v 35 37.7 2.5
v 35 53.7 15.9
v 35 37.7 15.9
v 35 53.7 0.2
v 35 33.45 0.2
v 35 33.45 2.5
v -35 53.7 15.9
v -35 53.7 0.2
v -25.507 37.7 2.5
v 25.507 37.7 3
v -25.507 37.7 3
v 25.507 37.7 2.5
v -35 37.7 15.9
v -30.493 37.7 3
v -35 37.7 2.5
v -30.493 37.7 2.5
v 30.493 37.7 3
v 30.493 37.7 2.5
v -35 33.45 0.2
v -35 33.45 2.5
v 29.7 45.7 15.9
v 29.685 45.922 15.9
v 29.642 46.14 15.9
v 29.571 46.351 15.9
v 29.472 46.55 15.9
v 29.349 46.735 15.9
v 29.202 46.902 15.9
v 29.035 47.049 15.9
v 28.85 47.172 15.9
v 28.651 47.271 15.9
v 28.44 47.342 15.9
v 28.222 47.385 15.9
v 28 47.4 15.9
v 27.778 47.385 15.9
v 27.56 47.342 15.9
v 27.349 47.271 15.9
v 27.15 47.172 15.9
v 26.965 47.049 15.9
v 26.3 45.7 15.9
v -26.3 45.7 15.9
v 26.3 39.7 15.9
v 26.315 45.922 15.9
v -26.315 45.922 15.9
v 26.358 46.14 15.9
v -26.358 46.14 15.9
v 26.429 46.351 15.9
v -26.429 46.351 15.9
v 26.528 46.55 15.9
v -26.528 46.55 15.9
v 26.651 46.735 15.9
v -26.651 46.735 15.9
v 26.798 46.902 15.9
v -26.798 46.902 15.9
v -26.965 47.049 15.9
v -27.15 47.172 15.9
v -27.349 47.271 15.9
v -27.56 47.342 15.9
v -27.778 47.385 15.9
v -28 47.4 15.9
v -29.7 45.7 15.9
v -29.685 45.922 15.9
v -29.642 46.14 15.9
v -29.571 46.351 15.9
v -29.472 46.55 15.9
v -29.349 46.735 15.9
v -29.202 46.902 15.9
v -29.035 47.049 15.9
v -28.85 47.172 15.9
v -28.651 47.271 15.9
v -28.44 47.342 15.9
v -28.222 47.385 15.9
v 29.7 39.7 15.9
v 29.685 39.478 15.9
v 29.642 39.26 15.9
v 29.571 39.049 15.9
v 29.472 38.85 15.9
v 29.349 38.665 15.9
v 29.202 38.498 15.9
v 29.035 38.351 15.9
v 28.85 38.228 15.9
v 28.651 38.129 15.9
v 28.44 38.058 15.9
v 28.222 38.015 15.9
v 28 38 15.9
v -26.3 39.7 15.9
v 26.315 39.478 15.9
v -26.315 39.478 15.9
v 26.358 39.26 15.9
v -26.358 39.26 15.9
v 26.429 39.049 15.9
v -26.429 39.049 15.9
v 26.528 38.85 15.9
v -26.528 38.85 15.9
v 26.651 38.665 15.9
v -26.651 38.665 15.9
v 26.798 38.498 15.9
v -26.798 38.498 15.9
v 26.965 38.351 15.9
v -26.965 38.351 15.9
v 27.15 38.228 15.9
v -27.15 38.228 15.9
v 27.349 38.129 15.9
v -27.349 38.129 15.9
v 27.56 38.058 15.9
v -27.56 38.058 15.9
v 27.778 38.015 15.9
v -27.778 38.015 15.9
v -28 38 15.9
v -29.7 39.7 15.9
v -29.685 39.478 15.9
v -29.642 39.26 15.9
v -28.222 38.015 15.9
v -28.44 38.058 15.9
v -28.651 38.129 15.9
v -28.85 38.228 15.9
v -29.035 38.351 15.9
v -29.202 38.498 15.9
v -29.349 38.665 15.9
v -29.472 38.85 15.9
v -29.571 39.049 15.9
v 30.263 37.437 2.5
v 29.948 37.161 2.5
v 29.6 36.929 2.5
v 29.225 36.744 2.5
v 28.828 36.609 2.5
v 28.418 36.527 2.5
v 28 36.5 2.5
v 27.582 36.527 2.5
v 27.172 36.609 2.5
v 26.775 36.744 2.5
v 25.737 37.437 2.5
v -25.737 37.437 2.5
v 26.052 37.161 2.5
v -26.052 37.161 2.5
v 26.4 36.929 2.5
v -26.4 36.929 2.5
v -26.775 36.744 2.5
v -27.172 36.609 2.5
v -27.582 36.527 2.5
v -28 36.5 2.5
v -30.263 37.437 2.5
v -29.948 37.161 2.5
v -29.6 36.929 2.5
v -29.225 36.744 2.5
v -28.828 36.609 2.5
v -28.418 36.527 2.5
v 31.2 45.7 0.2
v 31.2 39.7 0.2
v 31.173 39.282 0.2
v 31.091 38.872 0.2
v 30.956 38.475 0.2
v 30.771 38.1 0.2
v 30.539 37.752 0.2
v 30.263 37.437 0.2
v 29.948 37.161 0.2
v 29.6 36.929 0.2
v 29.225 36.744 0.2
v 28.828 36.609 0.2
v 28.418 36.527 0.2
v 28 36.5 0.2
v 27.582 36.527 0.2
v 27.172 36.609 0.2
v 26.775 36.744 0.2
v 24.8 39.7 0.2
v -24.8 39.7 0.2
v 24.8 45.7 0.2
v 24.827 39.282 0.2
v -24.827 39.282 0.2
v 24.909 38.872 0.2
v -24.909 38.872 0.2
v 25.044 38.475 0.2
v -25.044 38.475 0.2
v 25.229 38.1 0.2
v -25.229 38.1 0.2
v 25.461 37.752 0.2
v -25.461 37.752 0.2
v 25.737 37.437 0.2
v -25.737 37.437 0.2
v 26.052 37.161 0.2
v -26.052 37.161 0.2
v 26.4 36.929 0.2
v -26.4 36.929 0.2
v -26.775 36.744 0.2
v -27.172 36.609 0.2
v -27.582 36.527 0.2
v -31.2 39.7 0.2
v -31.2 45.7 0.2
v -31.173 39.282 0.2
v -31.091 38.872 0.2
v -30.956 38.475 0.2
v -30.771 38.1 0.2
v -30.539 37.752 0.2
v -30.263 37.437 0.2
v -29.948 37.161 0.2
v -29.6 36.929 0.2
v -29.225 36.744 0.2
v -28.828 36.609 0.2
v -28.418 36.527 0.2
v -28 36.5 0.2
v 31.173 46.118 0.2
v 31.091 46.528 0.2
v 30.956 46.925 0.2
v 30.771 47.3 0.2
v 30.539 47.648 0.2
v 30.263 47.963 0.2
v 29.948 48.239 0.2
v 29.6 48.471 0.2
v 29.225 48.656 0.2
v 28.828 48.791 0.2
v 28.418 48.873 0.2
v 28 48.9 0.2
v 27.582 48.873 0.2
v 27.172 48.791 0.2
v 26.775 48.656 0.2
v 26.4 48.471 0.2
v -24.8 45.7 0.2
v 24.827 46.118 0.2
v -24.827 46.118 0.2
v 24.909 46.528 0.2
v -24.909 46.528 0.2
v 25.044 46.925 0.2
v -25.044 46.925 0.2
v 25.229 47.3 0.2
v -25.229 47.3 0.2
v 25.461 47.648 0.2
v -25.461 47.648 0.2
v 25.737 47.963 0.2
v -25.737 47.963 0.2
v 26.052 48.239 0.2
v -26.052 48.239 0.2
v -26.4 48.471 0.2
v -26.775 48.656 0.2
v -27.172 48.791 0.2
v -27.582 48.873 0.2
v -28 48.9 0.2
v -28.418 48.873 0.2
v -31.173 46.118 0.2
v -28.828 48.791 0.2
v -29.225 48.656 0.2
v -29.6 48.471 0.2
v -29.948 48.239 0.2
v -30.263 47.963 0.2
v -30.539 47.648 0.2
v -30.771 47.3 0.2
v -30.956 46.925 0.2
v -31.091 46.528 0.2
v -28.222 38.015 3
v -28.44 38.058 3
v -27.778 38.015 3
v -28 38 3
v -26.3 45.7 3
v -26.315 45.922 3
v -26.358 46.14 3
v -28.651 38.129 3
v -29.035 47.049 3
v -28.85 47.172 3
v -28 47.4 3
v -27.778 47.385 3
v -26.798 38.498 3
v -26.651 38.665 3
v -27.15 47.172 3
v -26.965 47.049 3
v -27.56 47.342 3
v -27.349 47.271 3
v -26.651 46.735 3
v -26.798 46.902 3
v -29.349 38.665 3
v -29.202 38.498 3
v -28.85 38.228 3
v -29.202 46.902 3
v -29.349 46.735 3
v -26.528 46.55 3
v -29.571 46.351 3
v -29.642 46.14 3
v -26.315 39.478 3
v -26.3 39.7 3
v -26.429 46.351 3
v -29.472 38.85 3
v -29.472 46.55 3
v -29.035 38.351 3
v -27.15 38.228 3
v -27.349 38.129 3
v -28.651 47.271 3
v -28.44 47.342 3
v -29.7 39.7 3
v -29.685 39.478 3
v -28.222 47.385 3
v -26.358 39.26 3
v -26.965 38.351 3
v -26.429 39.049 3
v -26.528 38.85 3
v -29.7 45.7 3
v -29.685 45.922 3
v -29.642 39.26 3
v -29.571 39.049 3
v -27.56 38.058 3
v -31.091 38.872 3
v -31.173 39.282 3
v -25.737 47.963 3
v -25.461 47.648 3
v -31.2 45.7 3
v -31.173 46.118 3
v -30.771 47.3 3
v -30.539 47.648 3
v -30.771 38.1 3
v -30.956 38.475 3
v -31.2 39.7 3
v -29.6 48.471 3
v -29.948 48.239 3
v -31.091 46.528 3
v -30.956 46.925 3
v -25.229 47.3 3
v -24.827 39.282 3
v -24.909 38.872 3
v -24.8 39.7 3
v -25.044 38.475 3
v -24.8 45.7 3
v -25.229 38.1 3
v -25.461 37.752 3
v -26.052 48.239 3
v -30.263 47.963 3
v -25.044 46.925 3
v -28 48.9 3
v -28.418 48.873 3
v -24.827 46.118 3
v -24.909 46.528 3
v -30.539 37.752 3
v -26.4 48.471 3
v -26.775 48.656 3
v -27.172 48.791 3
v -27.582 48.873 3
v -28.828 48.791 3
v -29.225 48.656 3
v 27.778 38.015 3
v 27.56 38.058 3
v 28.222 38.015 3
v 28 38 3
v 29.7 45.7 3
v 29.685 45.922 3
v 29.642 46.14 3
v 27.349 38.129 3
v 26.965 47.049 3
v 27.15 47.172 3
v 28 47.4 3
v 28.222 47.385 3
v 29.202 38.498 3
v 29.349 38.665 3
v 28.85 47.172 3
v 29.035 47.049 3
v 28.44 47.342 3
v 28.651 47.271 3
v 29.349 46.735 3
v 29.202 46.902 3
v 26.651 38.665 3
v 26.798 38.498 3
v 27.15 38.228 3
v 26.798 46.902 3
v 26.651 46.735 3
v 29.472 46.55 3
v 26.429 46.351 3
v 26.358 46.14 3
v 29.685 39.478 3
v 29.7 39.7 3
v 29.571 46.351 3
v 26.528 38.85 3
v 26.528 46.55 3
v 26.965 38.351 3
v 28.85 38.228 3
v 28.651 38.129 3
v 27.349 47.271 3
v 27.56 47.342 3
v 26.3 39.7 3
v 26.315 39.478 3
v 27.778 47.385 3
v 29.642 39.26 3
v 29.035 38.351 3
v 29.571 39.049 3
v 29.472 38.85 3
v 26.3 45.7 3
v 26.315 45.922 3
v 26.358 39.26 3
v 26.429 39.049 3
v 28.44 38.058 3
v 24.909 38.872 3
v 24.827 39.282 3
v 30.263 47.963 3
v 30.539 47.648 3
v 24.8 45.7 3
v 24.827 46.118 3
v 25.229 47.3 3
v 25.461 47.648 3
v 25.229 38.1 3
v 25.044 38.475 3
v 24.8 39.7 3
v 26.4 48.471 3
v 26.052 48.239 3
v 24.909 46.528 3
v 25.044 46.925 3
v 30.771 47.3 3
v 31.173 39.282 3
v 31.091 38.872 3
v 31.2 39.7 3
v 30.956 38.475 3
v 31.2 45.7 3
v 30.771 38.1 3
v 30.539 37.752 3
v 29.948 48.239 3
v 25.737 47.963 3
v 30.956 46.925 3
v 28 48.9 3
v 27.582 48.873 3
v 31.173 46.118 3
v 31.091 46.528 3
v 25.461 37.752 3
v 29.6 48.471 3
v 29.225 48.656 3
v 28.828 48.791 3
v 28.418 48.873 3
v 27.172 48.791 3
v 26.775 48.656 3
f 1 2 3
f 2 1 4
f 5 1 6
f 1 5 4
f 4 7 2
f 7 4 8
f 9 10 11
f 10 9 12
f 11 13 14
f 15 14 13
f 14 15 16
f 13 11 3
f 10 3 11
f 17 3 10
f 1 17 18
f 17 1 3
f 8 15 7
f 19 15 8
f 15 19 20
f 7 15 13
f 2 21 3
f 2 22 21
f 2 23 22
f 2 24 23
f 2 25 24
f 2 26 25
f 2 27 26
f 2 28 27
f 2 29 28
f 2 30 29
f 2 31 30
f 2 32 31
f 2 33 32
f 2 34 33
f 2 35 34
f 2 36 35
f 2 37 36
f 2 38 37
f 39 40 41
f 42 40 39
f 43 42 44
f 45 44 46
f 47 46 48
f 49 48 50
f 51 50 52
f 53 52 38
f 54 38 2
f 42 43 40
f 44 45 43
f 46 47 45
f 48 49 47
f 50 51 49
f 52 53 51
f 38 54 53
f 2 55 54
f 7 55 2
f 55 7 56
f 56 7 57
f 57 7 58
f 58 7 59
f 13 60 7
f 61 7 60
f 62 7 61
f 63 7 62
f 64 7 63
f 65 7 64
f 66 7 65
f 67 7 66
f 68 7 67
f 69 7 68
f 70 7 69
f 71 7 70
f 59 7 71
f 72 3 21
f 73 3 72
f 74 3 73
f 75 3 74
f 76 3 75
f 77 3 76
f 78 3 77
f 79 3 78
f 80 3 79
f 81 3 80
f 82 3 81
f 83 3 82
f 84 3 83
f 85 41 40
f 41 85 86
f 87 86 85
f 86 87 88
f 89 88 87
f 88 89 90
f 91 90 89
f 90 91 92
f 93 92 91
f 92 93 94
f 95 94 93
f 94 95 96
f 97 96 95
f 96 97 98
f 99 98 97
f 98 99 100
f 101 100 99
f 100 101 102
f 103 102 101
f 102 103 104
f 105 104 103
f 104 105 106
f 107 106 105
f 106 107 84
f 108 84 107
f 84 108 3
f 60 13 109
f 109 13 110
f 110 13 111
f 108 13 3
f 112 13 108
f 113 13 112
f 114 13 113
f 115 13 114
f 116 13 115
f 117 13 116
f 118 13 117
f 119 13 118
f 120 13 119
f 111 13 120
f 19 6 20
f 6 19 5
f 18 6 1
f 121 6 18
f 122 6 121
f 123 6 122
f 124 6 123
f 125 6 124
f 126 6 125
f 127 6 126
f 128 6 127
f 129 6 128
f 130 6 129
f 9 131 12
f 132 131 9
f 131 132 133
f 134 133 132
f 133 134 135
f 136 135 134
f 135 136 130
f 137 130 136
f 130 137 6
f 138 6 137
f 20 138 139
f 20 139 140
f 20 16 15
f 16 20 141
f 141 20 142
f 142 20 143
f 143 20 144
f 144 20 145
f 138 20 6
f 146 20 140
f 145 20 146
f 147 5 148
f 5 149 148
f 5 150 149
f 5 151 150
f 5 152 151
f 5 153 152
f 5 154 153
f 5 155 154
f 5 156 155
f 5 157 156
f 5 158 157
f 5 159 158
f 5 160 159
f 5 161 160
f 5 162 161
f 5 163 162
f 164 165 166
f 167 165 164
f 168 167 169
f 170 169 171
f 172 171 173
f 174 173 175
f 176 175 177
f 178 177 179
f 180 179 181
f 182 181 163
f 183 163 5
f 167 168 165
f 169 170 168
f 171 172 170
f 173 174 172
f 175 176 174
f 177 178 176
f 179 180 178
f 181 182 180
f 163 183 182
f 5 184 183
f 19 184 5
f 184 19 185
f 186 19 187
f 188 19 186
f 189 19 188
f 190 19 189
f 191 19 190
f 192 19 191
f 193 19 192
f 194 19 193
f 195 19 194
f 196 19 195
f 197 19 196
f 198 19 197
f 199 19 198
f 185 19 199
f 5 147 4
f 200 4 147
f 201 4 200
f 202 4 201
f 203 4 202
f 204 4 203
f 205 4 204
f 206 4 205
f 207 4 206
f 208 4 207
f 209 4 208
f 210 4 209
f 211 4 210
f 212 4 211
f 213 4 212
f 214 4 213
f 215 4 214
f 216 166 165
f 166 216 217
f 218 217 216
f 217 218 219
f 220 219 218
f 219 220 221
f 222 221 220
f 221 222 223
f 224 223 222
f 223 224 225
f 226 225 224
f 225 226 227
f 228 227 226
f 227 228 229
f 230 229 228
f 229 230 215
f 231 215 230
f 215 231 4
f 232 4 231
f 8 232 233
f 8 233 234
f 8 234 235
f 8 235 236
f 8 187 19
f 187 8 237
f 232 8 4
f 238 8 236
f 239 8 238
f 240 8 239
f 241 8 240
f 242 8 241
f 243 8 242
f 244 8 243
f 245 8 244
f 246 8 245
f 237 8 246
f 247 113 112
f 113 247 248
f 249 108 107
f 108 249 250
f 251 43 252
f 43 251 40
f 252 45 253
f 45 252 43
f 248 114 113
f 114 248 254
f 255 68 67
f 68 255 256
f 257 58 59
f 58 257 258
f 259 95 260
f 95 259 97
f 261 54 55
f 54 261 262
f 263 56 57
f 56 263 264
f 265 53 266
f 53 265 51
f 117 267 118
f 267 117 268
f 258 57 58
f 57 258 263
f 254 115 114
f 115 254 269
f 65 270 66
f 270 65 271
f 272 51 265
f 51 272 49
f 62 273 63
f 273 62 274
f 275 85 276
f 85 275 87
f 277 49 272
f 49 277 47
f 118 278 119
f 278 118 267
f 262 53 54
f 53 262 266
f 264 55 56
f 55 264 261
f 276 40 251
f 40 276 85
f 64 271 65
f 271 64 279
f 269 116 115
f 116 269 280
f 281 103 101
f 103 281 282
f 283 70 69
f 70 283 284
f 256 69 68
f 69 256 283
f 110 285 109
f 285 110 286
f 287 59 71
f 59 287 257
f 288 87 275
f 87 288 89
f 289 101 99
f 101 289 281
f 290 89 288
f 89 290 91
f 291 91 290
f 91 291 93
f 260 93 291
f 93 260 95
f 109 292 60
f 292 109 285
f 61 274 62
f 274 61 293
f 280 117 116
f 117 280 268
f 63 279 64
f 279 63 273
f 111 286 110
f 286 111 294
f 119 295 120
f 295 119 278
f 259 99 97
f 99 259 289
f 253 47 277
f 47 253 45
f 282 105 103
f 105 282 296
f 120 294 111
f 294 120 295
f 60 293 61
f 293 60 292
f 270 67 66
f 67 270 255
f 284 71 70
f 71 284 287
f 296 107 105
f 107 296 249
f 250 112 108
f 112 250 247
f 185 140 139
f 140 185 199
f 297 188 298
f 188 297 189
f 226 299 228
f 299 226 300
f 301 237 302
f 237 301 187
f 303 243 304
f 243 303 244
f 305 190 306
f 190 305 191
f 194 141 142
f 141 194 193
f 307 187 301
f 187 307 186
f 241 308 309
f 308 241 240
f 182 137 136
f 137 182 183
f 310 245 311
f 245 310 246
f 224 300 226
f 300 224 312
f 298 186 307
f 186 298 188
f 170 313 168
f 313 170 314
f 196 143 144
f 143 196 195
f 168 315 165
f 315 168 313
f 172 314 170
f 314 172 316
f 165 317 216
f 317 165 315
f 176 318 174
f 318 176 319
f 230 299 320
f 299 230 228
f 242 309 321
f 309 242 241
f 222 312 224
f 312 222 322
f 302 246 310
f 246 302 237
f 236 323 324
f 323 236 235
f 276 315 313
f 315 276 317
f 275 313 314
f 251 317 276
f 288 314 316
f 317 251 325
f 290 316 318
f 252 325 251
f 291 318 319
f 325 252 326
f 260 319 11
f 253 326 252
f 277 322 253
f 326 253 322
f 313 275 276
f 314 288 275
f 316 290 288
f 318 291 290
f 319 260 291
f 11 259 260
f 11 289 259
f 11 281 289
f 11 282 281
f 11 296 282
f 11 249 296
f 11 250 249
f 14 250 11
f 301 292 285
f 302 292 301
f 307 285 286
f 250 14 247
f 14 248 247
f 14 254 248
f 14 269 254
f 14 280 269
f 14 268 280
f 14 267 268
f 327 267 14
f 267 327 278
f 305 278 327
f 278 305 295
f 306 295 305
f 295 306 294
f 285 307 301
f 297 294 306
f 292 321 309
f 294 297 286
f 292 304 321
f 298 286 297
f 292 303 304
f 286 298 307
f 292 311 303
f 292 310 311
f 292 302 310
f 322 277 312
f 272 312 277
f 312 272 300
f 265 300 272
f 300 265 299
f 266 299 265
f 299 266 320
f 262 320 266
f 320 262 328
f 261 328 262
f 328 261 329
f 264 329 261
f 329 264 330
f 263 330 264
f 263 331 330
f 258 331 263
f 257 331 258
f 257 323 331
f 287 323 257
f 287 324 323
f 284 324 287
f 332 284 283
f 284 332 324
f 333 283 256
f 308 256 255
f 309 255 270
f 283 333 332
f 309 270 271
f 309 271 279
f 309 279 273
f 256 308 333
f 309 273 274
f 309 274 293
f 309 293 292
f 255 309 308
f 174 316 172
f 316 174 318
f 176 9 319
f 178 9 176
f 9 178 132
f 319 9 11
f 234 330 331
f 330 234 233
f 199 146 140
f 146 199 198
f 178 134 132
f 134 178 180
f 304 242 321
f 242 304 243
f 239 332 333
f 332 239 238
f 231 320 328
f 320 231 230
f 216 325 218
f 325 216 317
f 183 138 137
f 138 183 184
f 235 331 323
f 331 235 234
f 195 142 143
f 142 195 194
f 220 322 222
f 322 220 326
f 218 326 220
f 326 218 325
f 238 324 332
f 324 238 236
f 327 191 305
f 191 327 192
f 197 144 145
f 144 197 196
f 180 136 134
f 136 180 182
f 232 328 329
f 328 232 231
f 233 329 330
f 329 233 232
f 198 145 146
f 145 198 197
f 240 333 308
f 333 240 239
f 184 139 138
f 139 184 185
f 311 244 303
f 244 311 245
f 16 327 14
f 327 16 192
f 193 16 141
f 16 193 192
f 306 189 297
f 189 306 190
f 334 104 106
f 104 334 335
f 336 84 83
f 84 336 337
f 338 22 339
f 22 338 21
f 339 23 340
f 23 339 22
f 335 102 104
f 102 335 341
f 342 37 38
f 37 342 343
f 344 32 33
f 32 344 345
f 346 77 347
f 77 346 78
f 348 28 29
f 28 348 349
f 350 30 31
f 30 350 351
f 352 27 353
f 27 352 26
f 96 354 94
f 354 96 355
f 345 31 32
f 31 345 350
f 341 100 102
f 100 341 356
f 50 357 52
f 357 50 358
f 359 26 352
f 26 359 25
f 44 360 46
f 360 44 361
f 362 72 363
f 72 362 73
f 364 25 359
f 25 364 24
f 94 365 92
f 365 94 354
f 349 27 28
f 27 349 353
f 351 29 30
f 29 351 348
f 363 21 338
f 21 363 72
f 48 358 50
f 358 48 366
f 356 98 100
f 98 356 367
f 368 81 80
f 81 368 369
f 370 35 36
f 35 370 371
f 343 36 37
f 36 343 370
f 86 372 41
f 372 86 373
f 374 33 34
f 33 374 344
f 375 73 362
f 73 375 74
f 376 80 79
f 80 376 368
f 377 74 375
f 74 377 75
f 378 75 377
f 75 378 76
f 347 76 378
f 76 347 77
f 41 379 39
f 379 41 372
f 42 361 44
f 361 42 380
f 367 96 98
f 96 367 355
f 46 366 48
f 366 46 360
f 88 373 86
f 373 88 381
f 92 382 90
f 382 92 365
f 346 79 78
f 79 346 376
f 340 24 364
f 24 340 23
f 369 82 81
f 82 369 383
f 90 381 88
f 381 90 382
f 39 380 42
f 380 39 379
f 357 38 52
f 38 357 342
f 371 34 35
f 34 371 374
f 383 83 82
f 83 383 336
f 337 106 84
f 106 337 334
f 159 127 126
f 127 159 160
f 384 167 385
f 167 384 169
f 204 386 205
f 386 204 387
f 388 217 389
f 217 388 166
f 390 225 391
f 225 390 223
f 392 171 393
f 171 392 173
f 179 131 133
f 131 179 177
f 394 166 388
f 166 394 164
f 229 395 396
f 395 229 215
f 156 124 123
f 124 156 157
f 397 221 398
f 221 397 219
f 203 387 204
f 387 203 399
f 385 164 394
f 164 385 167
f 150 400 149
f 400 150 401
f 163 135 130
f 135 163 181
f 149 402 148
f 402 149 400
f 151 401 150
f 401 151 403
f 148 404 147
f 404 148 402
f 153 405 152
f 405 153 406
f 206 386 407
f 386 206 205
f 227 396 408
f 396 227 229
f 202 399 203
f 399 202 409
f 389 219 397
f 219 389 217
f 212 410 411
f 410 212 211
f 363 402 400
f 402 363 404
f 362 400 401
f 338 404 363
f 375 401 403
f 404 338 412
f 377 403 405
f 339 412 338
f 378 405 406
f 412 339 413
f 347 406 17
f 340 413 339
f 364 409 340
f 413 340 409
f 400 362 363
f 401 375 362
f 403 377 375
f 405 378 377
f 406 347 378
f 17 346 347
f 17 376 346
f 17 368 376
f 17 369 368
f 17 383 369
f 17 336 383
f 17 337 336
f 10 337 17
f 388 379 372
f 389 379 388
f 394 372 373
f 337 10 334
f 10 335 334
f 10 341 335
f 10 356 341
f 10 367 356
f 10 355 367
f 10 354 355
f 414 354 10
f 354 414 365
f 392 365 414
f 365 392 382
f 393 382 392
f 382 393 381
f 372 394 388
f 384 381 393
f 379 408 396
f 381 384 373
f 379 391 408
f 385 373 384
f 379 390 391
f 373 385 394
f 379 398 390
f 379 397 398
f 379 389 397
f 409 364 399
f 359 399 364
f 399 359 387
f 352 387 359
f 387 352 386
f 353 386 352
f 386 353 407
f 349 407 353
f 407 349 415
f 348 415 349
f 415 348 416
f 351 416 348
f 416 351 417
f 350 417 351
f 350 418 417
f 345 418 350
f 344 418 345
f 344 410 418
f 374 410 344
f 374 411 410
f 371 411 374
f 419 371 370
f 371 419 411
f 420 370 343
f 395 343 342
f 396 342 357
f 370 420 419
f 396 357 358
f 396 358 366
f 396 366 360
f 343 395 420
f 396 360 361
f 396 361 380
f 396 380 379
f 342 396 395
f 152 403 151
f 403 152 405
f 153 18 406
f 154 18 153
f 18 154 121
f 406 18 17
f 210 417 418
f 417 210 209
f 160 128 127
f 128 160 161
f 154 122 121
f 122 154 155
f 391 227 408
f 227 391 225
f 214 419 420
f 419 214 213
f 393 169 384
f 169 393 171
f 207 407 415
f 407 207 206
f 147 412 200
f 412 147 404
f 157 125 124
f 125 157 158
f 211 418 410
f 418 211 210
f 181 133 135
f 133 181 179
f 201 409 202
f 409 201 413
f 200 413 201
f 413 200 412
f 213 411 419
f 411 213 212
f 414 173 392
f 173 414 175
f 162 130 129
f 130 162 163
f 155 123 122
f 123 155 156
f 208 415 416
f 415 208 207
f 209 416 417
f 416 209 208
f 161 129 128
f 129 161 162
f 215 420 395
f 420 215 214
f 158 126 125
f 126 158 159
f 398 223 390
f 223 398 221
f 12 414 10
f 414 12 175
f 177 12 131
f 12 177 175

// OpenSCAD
// file: head_plate.scad
// =====================================================================
//  DeskMate DIY – KASK, część przednia (ramka telefonu + płyta z kieszenią
//  ładowarki) i DASZEK (górny, regulowany zaczep telefonu).
//  Jeden komplet na profil telefonu:  -D 'profile="fold8_open"'
//  Układ: oś TILT = oś X, telefon z przodu (+Y).
//  Druk przodu kasku: tyłem (płaską płytą) do stołu, bez podpór.
// =====================================================================
include <params.scad>

// ---------- obrys kasku (widok z przodu, x -> X, y -> Z) ----------
function hd_zb() = min(ph_bot() - hook_h - bottom_bar, pad_cz() - pad_rp() - 6);
function hd_zt() = max(ph_top() + forehead, pad_cz() + pad_rp() + 6);
function hd_r()  = min(head_r, (hd_zt() - hd_zb())/2 - 1);
module hd_outline(d = 0) {
  offset(r = d) rrect([-head_w, hd_zb()], [head_w, hd_zt()], hd_r());
}
function cav_x() = ph_L()/2 + fit_x;                     // wnęka telefonu ±X
function vis_z0() = ph_top() + tol;                      // spód daszka (nad telefonem)
function vis_screw_z() = vis_z0() + vis_h/2;

// bryła z zaokrągloną przednią krawędzią (wycinki połączone hull)
module rounded_front(y0, y1, r, d0 = 0) {
  hull() {
    xz_extrude(y0, y1 - r) hd_outline(d0);
    for (a = [15 : 15 : 90])
      xz_extrude(y1 - r + r*sin(a) - 0.01, y1 - r + r*sin(a)) hd_outline(d0 - r*(1 - cos(a)));
  }
}

module head_front() {
  pc = pad_cz();
  yf = y_front();
  difference() {
    union() {
      rounded_front(slab_back() + skirt, yf, front_r);
      // stopień pod zakładkę tylnej skorupy
      xz_extrude(slab_back(), slab_back() + skirt + 0.01) hd_outline(-shell_t - 0.15);
    }
    // ---- odchudzenie: komory od tyłu (zamknięte od przodu skórą 2.5–3 mm)
    hd_lighten();
    // ---- wnęka telefonu i okno ekranu
    translate([-cav_x(), slab_front, ph_bot()]) cube([2*cav_x(), lip_y0() - slab_front, ph_H() + tol]);
    translate([-cav_x(), lip_y0() - 0.01, ph_bot() + lip_h]) cube([2*cav_x(), 30, ph_H() - lip_h + tol]);
    // wnęka w półce (przyciski boczne) i wycięcie wargi (palec)
    translate([-shelf_cut_w/2, slab_front, ph_bot() - 2.5]) cube([shelf_cut_w, lip_y0() - slab_front, 3]);
    translate([-20, lip_y0() - 0.01, ph_bot() - 0.01]) cube([40, 30, lip_h + 0.02]);
    // okna na gniazdo USB-C / głośnik po bokach (otwarte do przodu)
    for (s = [-1, 1]) translate([s > 0 ? cav_x() - 1 : -head_w - 1, D_back - 2, ph_cz() - 7])
      cube([head_w - cav_x() + 2, 30, 14]);
    // ---- gniazdo daszka (+ zapas na podniesienie)
    translate([-vis_w/2 - tol, slab_front, ph_top() - 0.01])
      cube([vis_w + 2*tol, 40, vis_h + vis_travel + 2*tol]);
    for (s = [-1, 1]) translate([s*vis_screw_x, 0, vis_screw_z()]) cyl_y(ins_d, slab_front - ins_l, slab_front + 1);
    // ---- kieszeń ładowarki (wierzch ładowarki = tył telefonu)
    translate([0, 0, pc]) cyl_y(2*pad_rp(), pocket_floor(), pad_top_y() + 0.3);
    // kanał wtyku/kabla + przelot do tyłu + szczeliny opaski (odciążenie)
    translate([0, 0, pc]) rotate([0, -pad_port_angle, 0]) {
      translate([pad_rp() - 3, pocket_floor(), -port_w()/2]) cube([chan_len + 3, pad_top_y() + 0.3 - pocket_floor(), port_w()]);
      translate([pad_rp() + chan_len - 12, slab_back() - 1, -port_w()/2]) cube([12, 30, port_w()]);
      for (s = [-1, 1]) translate([pad_rp() + chan_len - 22, slab_back() - 1, s*(port_w()/2 + 3) - 1.5]) cube([4, 30, 3]);
    }
    // dno: szczeliny powietrza między żebrami
    translate([0, 0, pc]) xz_extrude(slab_back() - 1, pocket_floor() + 0.01)
      for (r = [pad_rp()*0.45, pad_rp()*0.72])
        if (r > (fan_on ? fan_size/2 + 3 : 6))
          for (a = [0 : 45 : 359]) arc_slot2d(r, 5, a + 9, a + 36);
    // wentylator 30x30 (z tyłu płyty)
    if (fan_on) translate([0, 0, pc]) {
      cyl_y(fan_size - 2, slab_back() - 1, pocket_floor() + 0.01);
      for (sx = [-1, 1], sz = [-1, 1])
        translate([sx*fan_pitch/2, 0, sz*fan_pitch/2]) cyl_y(m3_clear, slab_back() - 1, pocket_floor() + 1);
    }
    // wkładki: łapy uchwytów serwa / łożyska (od tyłu)
    for (s = [-1, 1], tz = tab_z) translate([s*tab_x, 0, (tz[0] + tz[1])/2])
      cyl_y(ins_d, slab_back() - 1, slab_back() + ins_l);
    // wkładki: śruby tylnej skorupy (góra i dół, w stopniu)
    for (s = [-1, 1]) {
      translate([s*dome_screw_x, slab_back() + skirt/2, hd_zt() - shell_t - ins_l]) cylinder(d = ins_d, h = ins_l + 1);
      translate([s*dome_screw_x, slab_back() + skirt/2, hd_zb() + shell_t - 1]) cylinder(d = ins_d, h = ins_l + 1);
    }
    // czujnik dotyku TTP223 na czubku + przewód do tyłu
    translate([ttp_x - ttp[0]/2, slab_back() + skirt + 2, hd_zt() - ttp[2]]) cube([ttp[0], ttp[1], 10]);
    translate([ttp_x - 2, slab_back() - 1, hd_zt() - ttp[2] - 6]) cube([4, skirt + 4 + ttp[1]/2, 6.01]);
    // antenka: 2 wkładki + przelot przewodów
    for (s = [-1, 1]) translate([s*8, ant_y(), hd_zt() - ins_l]) cylinder(d = ins_d, h = ins_l + 1);
    translate([0, ant_y(), hd_zt() - 12]) cylinder(d = 4, h = 13);
    translate([-2, slab_back() - 1, hd_zt() - 12]) cube([4, ant_y() - slab_back() + 1, 4]);
  }
  // żebra pod ładowarką
  translate([0, 0, pc]) intersection() {
    xz_extrude(pocket_floor() - 0.01, pocket_floor() + rib_h) union() {
      for (a = [0 : 45 : 359]) rotate(a)
        translate([fan_on ? fan_size/2 - 1 : 6, -1.2]) square([pad_rp(), 2.4]);
      difference() { circle(r = pad_rp() + 0.1); circle(r = pad_rp() - 2.5); }
    }
    cyl_y(2*pad_rp() + 0.1, pocket_floor() - 1, pocket_floor() + rib_h + 1);
  }
}
// strefy, które muszą zostać pełne (widok z przodu)
module hd_keep2d() {
  translate([0, pad_cz()]) circle(r = pad_rp() + 3);
  translate([0, pad_cz()]) rotate(pad_port_angle) translate([0, -port_w()/2 - 9]) square([pad_rp() + chan_len + 4, port_w() + 18]);
  for (s = [-1, 1], tz = tab_z) translate([s*tab_x, (tz[0] + tz[1])/2]) circle(r = 7);
  for (s = [-1, 1]) translate([s*vis_screw_x, vis_screw_z()]) circle(r = 6);
  for (s = [-1, 1]) translate([s*dome_screw_x - 6, hd_zt() - 14]) square([12, 20]);
  for (s = [-1, 1]) translate([s*dome_screw_x - 6, hd_zb() - 6]) square([12, 20]);
  translate([-14, hd_zt() - 18]) square([28, 30]);                 // antenka
  translate([ttp_x - 12, hd_zt() - 14]) square([24, 20]);          // TTP223
  for (s = [-1, 1]) translate([s > 0 ? cav_x() - 4 : -head_w, ph_cz() - 11]) square([head_w - cav_x() + 4, 22]);
}
module hd_lighten() {
  // za wnęką telefonu
  xz_extrude(slab_back() - 1, slab_front - 2.5) difference() { offset(r = -5) hd_outline(); hd_keep2d(); }
  // w ramce (boki, czoło, dół) – poza telefonem i daszkiem
  xz_extrude(slab_front - 3, y_front() - 3.5) difference() {
    offset(r = -5) hd_outline();
    hd_keep2d();
    translate([-cav_x() - 3, ph_bot() - 3]) square([2*cav_x() + 6, ph_H() + 6]);
    translate([-vis_w/2 - 4, ph_top() - 2]) square([vis_w + 8, vis_h + vis_travel + 8]);
  }
}
function ant_y() = (slab_back() + skirt + slab_front) / 2;

// ---------- daszek: górny zaczep telefonu (2 x M3 w szczelinach) ----------
module visor() {
  yf = y_front();
  difference() {
    intersection() {
      union() {
        translate([-vis_w/2, slab_front + 0.3, vis_z0()]) cube([vis_w, yf - slab_front - 0.3, vis_h]);
        translate([-vis_w/2, lip_y0(), vis_z0() - lip_h - tol]) cube([vis_w, lip_t, lip_h + tol + 1]);
      }
      // przód zaokrąglony jak ramka
      rounded_front(slab_front - 1, yf - 0.2, front_r, -0.3);
    }
    for (s = [-1, 1]) translate([s*vis_screw_x, 0, 0]) {
      hull() for (dz = [-vis_travel, 0]) translate([0, 0, vis_screw_z() + dz]) cyl_y(m3_clear, slab_front, yf + 1);
      hull() for (dz = [-vis_travel, 0]) translate([0, 0, vis_screw_z() + dz]) cyl_y(6.4, yf - 3, yf + 1);
    }
  }
}

if (is_undef(ASM)) {
  translate([0, 0, -slab_back()]) rotate([90, 0, 0]) head_front();
}
// main file
// =====================================================================
//  DeskMate DIY – DASZEK (górny zaczep telefonu), 1 szt. na profil
//  Wsuwany w gniazdo nad telefonem, 2 x M3x20 z łbem grzybkowym przez
//  pionowe szczeliny (regulacja 6 mm) do wkładek w płycie kasku.
//  Druk: przednią powierzchnią do stołu, bez podpór.
// =====================================================================
ASM = true;
include <head_plate.scad>
translate([0, 0, y_front()]) rotate([-90, 0, 0]) visor();   // przodem do stołu
